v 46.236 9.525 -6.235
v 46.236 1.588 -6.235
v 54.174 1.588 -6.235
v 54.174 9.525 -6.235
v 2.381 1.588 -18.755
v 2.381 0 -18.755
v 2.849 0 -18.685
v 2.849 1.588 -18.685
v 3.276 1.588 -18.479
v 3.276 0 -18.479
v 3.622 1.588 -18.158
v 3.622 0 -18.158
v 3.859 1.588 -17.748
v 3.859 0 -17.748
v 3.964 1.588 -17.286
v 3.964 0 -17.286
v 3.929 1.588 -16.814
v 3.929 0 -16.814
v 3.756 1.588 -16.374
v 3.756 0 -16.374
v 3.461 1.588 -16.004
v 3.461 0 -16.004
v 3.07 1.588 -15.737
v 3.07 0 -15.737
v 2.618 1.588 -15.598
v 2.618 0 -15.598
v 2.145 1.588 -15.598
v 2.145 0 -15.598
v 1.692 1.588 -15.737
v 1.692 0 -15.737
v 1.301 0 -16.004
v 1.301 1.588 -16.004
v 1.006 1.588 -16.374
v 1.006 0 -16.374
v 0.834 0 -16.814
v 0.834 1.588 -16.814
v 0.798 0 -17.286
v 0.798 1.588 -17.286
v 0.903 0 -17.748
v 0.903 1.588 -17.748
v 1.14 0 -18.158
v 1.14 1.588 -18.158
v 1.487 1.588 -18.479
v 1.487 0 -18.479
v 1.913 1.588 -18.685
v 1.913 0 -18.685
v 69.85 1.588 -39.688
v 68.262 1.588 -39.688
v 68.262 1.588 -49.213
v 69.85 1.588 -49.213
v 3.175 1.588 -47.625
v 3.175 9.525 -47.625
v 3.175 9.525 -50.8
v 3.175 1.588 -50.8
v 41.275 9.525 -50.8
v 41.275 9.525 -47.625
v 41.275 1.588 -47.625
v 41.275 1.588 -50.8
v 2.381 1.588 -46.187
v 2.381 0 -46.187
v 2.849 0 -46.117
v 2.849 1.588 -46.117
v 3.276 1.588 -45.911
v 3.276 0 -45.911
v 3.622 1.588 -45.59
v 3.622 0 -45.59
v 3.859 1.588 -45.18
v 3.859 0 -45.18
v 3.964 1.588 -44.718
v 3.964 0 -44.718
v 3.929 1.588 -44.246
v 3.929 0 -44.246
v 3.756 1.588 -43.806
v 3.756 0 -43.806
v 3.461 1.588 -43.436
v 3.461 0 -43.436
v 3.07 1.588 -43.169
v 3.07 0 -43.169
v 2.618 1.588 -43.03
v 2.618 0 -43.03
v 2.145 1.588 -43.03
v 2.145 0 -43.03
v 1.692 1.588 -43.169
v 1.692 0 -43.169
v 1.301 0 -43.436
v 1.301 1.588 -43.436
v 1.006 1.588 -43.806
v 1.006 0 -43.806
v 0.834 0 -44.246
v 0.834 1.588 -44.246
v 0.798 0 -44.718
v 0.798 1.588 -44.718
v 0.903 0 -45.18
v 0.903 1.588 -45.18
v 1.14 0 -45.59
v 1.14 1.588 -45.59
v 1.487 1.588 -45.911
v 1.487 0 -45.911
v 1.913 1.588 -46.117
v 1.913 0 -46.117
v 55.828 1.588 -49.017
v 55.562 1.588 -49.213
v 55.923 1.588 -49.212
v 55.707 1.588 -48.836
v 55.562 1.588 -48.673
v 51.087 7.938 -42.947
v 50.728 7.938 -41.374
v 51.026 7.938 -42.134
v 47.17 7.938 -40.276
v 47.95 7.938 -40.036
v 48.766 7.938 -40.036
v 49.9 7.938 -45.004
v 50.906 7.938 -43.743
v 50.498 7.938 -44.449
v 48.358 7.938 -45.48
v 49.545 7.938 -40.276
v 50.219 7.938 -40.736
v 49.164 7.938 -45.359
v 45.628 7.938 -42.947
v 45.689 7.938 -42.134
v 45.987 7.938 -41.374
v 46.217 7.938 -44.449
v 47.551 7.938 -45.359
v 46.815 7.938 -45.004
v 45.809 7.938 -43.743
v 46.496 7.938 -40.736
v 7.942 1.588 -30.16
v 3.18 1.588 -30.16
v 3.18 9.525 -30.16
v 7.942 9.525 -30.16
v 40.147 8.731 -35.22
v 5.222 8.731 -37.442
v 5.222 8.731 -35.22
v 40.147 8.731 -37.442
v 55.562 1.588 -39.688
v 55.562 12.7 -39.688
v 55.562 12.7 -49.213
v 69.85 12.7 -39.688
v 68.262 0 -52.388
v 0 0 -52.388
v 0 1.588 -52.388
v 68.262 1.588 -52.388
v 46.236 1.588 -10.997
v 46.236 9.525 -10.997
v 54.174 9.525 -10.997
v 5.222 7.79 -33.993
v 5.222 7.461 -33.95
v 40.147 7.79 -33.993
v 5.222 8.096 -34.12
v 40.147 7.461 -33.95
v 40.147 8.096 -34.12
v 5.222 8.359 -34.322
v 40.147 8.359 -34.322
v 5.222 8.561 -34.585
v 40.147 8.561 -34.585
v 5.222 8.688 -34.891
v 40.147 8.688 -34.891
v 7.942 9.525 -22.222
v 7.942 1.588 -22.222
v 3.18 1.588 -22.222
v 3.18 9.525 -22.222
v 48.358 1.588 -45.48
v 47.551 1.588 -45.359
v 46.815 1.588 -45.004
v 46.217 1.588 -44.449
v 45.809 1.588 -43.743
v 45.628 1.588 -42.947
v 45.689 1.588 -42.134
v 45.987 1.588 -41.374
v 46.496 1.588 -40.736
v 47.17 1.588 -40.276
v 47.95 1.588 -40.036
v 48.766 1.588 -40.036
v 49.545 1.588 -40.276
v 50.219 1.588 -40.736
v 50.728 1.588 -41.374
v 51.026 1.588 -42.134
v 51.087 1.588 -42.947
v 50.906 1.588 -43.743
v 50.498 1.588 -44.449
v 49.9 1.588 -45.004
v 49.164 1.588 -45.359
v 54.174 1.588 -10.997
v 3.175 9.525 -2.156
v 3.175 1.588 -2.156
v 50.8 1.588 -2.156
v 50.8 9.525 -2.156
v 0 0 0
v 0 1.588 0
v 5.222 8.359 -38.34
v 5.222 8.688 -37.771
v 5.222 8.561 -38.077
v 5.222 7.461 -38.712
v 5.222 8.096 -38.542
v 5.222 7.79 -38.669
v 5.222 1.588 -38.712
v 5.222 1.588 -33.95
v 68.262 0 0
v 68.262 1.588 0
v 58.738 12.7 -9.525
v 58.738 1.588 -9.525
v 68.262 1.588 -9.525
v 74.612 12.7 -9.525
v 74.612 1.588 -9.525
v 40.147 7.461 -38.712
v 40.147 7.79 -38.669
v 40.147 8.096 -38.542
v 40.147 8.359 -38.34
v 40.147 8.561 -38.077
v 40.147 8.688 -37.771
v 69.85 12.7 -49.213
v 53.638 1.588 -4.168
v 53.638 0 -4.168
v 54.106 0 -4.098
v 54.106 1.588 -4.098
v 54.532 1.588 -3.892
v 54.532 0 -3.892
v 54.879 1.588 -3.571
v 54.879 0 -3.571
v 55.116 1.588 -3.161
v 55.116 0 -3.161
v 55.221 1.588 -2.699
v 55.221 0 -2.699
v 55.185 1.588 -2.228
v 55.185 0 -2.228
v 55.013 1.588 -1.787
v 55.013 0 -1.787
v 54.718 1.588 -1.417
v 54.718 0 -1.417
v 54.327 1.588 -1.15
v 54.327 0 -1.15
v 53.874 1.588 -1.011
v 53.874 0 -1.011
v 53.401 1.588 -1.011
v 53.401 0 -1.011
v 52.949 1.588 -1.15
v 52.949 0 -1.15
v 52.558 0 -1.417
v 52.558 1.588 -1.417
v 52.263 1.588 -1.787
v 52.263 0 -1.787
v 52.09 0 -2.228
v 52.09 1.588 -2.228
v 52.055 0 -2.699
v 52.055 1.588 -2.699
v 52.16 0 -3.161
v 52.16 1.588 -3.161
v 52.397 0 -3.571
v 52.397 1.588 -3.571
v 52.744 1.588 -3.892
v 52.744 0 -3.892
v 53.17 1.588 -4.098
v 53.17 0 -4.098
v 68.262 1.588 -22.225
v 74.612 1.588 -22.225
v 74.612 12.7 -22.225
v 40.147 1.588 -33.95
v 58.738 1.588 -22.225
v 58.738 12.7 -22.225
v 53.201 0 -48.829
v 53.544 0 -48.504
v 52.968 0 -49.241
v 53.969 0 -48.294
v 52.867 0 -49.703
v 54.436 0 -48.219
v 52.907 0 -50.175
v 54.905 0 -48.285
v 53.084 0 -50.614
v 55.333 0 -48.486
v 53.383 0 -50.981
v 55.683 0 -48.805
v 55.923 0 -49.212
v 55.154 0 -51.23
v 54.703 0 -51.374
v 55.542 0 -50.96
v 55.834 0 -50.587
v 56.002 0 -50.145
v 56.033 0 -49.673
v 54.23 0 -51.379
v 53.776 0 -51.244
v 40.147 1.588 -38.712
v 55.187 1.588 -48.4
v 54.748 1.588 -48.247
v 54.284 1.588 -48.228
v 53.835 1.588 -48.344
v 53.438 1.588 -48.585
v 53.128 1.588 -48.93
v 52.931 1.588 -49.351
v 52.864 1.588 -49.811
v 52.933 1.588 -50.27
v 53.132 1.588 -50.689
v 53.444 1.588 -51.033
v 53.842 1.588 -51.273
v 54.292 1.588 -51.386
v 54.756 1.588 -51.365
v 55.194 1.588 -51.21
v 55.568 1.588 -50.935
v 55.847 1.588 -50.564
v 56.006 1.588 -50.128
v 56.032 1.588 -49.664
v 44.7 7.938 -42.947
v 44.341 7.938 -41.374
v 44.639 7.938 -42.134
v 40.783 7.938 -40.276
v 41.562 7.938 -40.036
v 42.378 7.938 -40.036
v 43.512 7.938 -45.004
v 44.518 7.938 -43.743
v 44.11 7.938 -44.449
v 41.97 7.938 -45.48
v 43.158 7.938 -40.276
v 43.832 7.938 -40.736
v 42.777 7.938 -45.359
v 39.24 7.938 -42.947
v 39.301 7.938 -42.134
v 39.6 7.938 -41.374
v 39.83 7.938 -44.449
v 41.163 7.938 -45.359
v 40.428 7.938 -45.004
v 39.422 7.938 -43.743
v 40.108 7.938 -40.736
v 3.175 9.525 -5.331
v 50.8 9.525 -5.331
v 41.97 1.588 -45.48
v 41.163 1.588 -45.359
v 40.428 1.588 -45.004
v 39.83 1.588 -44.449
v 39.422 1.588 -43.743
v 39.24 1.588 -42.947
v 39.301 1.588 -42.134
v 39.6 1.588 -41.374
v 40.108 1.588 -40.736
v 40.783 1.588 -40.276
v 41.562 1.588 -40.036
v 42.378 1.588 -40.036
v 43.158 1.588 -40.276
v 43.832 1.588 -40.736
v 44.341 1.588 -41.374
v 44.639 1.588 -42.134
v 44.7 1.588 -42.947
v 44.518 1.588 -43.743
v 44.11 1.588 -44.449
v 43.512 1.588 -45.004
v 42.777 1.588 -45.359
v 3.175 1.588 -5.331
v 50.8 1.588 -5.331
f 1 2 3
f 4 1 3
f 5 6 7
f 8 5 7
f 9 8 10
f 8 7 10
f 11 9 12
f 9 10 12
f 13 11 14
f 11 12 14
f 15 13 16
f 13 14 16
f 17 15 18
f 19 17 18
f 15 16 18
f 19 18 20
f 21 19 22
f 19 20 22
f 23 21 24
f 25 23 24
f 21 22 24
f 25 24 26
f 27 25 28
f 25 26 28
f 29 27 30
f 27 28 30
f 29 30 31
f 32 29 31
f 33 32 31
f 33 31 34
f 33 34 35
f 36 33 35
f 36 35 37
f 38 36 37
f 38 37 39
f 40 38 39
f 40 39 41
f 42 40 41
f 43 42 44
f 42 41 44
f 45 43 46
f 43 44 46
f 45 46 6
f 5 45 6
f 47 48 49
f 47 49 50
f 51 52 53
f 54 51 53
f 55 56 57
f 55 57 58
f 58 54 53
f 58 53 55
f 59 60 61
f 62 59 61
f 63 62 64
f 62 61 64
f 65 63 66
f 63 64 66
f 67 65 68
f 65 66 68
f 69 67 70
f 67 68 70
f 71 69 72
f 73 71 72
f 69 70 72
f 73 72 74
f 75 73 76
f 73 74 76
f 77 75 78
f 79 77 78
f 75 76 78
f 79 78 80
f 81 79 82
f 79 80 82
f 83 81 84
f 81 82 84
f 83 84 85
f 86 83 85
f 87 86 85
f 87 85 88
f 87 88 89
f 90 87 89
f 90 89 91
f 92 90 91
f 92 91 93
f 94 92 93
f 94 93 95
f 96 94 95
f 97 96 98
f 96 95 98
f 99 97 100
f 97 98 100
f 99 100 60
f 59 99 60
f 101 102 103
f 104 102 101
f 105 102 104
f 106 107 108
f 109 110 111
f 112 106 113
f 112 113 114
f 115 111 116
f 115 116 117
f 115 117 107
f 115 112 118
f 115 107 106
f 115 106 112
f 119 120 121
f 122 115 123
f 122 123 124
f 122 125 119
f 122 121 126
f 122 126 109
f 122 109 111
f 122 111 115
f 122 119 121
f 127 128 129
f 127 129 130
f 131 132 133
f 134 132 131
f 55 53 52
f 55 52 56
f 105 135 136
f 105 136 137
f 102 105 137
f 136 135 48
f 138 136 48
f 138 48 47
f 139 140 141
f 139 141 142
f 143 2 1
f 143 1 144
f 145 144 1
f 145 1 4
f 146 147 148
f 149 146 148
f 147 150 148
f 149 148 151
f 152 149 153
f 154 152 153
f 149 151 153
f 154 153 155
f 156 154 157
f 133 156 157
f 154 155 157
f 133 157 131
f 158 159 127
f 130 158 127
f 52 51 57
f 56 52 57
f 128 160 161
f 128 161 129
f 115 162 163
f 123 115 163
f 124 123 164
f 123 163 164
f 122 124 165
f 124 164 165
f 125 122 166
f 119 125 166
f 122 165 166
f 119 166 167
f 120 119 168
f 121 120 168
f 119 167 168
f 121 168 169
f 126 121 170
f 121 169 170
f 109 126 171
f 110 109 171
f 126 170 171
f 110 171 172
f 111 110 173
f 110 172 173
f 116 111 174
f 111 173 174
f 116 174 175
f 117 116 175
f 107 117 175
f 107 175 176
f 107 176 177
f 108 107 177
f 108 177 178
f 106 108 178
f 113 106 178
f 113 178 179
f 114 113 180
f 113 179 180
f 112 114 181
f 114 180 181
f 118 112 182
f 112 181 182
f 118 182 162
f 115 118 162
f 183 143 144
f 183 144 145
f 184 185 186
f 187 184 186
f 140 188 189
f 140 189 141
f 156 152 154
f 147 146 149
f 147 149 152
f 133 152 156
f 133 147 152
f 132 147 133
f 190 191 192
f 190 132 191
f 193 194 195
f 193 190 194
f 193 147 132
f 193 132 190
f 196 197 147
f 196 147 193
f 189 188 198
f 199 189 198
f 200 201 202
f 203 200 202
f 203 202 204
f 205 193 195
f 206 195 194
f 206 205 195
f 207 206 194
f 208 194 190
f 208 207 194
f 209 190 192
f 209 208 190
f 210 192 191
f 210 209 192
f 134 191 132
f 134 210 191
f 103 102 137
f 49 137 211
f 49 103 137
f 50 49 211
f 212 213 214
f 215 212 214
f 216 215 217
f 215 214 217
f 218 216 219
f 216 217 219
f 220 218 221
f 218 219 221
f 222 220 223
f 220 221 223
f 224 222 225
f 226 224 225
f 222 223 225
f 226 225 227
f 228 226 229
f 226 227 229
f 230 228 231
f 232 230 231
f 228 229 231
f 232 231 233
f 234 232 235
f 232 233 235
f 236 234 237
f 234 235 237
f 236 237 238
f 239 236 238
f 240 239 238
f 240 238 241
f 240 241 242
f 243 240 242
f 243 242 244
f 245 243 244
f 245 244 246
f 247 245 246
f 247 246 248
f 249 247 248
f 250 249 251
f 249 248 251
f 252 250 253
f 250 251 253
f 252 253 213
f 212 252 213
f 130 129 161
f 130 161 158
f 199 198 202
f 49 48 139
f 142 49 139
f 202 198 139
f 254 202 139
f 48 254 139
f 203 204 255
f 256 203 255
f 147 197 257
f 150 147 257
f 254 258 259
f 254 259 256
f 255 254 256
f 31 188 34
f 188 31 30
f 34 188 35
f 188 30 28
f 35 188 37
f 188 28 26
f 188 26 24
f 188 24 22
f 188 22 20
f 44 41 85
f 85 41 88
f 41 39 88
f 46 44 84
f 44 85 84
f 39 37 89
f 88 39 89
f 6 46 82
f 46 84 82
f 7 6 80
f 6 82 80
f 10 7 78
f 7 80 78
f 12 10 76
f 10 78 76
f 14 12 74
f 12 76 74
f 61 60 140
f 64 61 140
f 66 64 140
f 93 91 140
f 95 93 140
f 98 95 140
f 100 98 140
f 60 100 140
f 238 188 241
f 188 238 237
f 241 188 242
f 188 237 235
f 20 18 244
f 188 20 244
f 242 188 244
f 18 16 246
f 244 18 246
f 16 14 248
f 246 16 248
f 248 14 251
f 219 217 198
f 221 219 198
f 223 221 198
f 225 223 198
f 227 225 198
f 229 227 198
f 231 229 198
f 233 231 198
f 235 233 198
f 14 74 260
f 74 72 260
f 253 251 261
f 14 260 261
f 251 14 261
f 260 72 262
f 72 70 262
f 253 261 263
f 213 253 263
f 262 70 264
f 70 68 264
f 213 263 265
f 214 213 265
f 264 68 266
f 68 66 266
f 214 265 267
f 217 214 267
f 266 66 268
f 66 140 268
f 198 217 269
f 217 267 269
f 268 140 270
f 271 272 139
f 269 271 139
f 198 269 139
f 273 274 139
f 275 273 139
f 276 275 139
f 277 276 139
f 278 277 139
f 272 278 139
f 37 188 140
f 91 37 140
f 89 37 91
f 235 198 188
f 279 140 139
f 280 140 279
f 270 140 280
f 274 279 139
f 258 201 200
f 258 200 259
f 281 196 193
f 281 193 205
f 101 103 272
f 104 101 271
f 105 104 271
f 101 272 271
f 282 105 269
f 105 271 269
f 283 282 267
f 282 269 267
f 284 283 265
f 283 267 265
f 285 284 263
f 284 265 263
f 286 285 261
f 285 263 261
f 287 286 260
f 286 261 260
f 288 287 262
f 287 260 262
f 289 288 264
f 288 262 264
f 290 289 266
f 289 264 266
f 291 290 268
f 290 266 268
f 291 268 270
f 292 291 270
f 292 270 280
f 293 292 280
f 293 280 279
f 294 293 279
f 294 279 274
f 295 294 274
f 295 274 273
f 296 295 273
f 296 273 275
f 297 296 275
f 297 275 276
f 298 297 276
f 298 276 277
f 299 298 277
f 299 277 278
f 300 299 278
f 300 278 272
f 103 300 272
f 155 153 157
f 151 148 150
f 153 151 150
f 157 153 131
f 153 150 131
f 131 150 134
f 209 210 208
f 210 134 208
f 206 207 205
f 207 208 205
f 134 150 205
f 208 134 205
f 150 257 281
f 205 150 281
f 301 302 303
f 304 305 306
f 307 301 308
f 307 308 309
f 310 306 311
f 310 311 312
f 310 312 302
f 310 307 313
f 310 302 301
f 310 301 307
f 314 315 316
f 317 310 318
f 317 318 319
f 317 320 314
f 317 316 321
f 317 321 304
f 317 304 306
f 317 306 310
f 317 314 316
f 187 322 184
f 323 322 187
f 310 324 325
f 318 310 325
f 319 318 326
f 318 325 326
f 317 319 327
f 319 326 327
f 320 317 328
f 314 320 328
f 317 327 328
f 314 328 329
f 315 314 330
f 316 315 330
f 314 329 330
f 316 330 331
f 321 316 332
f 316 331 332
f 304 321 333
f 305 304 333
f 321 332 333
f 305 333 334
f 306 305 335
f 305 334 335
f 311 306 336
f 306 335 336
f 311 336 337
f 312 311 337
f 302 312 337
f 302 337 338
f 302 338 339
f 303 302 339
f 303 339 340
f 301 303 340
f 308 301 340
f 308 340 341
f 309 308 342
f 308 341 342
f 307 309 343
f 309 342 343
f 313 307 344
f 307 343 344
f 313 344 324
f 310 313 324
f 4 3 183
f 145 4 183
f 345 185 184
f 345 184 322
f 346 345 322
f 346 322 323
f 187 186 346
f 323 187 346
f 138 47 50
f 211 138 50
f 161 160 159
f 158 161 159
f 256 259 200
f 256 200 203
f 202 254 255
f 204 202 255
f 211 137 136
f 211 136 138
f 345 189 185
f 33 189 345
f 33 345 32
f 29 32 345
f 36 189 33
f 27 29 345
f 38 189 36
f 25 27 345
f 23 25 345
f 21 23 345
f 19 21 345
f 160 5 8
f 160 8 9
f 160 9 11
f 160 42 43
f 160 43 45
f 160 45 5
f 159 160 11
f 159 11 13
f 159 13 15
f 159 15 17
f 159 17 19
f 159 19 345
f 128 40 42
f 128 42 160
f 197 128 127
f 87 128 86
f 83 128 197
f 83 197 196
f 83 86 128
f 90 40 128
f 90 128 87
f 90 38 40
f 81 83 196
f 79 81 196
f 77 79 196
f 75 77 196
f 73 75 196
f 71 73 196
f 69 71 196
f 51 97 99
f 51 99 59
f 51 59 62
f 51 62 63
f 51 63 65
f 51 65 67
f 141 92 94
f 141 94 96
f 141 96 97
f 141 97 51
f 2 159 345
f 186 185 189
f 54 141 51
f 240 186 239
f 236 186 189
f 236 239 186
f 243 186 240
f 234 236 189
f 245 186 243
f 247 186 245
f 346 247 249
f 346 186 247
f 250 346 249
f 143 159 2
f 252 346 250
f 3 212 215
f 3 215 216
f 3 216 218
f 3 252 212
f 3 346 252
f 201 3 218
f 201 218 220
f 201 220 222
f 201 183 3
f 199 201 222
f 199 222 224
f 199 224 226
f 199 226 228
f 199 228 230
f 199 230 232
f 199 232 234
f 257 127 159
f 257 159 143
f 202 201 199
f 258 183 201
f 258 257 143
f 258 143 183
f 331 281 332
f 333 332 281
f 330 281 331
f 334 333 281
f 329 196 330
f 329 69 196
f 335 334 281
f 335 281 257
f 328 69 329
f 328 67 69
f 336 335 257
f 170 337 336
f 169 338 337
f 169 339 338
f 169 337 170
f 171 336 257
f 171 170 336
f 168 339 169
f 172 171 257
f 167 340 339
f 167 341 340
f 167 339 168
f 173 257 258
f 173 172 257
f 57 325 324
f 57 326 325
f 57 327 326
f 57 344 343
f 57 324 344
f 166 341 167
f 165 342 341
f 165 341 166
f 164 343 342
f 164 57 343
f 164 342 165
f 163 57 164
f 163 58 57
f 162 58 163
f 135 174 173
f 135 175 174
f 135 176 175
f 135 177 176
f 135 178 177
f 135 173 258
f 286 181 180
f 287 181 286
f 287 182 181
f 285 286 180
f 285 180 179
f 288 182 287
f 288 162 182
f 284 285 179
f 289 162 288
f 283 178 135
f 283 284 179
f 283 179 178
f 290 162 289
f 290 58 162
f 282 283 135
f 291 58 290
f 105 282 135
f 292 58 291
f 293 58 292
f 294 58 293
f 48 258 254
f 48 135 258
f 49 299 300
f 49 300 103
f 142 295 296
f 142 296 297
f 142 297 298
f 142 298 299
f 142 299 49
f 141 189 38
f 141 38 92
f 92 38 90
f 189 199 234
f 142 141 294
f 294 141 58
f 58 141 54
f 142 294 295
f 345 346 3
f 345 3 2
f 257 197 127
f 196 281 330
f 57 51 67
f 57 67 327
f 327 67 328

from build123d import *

# Parameters (mm, degrees)
SKETCH2_W           = 68.2625
SKETCH2_H           = 52.3875
BOSS_EXTRUDE1_DEPTH = 1.5875
SKETCH3_W           = 38.1
SKETCH3_H           = 3.175
SKETCH3_W_2         = 47.625
SKETCH3_W_3         = 4.7625
SKETCH3_H_2         = 7.9375
SKETCH3_W_4         = 7.9375
SKETCH3_H_3         = 4.7625
BOSS_EXTRUDE2_DEPTH = 7.9375
SKETCH5_W           = 34.925
SKETCH5_H           = 4.7625
BOSS_EXTRUDE3_DEPTH = 7.14375
FILLET1_R           = 1.27
SKETCH6_R           = 2.737420774
BOSS_EXTRUDE4_DEPTH = 6.35
SKETCH7_W           = 15.875
SKETCH7_H           = 12.7
BOSS_EXTRUDE5_DEPTH = 11.1125
SKETCH8_W           = 14.2875
SKETCH8_H           = 9.525
BOSS_EXTRUDE6_DEPTH = 11.1125
SKETCH9_R           = 1.5875
CUT_EXTRUDE1_DEPTH  = 1.5875


with BuildPart() as part:
    # Sketch2 → Boss-Extrude1 (new body)
    with BuildSketch(Plane(origin=(0, 0, 0), x_dir=(1, 0, 0), z_dir=(0, 1, 0))):
        with Locations((34.13125, 26.19375)):
            Rectangle(SKETCH2_W, SKETCH2_H)
    extrude(amount=BOSS_EXTRUDE1_DEPTH)

    # Sketch3 → Boss-Extrude2 (add)
    with BuildSketch(Plane(origin=(0, 1.5875, 0), x_dir=(1, 0, 0), z_dir=(0, 1, 0))):
        with Locations((22.225, 49.2125)):
            Rectangle(SKETCH3_W, SKETCH3_H)
        with Locations((26.9875, 3.743785618)):
            Rectangle(SKETCH3_W_2, SKETCH3_H)
        with Locations((5.56088816, 26.190824392)):
            Rectangle(SKETCH3_W_3, SKETCH3_H_2)
        with Locations((50.20501244, 8.616122464)):
            Rectangle(SKETCH3_W_4, SKETCH3_H_3)
    extrude(amount=BOSS_EXTRUDE2_DEPTH)

    # Sketch5 → Boss-Extrude3 (add)
    with BuildSketch(Plane(origin=(0, 1.5875, 0), x_dir=(1, 0, 0), z_dir=(0, 1, 0))):
        with Locations((22.684927586, 36.331025526)):
            Rectangle(SKETCH5_W, SKETCH5_H)
    extrude(amount=BOSS_EXTRUDE3_DEPTH)

    # Fillet1
    fillet1_edges = [part.edges().sort_by_distance(p)[0] for p in [
        (22.684927586, 8.73125, -33.949775526),
        (22.684927586, 8.73125, -38.712275526),
    ]]
    fillet(fillet1_edges, radius=FILLET1_R)

    # Sketch6 → Boss-Extrude4 (add)
    with BuildSketch(Plane(origin=(0, 1.5875, 0), x_dir=(1, 0, 0), z_dir=(0, 1, 0))):
        with Locations(Location((41.97022767, 42.74270286, 0), (0, 0, 90))):
            Circle(SKETCH6_R)
        with Locations(Location((48.357542809, 42.74270286, 0), (0, 0, 90))):
            Circle(SKETCH6_R)
    extrude(amount=BOSS_EXTRUDE4_DEPTH)

    # Sketch7 → Boss-Extrude5 (add)
    with BuildSketch(Plane(origin=(0, 1.5875, 0), x_dir=(1, 0, 0), z_dir=(0, 1, 0))):
        with Locations((66.675, 15.875)):
            Rectangle(SKETCH7_W, SKETCH7_H)
    extrude(amount=BOSS_EXTRUDE5_DEPTH)

    # Sketch8 → Boss-Extrude6 (add)
    with BuildSketch(Plane(origin=(0, 1.5875, 0), x_dir=(1, 0, 0), z_dir=(0, 1, 0))):
        with Locations((62.70625, 44.45)):
            Rectangle(SKETCH8_W, SKETCH8_H)
    extrude(amount=BOSS_EXTRUDE6_DEPTH)

    # Sketch9 → Cut-Extrude1 (cut)
    with BuildSketch(Plane.XZ):
        with Locations(Location((53.637787609, -2.580775526, 0), (0, 0, 270))):
            Circle(SKETCH9_R)
        with Locations(Location((54.45125, -49.806724474, 0), (0, 0, 21.981959095))):
            Circle(SKETCH9_R)
        with Locations(Location((2.38125, -44.599724474, 0), (0, 0, 270))):
            Circle(SKETCH9_R)
        with Locations(Location((2.38125, -17.167724474, 0), (0, 0, 270))):
            Circle(SKETCH9_R)
    extrude(amount=-CUT_EXTRUDE1_DEPTH, mode=Mode.SUBTRACT)


solid = part.part
